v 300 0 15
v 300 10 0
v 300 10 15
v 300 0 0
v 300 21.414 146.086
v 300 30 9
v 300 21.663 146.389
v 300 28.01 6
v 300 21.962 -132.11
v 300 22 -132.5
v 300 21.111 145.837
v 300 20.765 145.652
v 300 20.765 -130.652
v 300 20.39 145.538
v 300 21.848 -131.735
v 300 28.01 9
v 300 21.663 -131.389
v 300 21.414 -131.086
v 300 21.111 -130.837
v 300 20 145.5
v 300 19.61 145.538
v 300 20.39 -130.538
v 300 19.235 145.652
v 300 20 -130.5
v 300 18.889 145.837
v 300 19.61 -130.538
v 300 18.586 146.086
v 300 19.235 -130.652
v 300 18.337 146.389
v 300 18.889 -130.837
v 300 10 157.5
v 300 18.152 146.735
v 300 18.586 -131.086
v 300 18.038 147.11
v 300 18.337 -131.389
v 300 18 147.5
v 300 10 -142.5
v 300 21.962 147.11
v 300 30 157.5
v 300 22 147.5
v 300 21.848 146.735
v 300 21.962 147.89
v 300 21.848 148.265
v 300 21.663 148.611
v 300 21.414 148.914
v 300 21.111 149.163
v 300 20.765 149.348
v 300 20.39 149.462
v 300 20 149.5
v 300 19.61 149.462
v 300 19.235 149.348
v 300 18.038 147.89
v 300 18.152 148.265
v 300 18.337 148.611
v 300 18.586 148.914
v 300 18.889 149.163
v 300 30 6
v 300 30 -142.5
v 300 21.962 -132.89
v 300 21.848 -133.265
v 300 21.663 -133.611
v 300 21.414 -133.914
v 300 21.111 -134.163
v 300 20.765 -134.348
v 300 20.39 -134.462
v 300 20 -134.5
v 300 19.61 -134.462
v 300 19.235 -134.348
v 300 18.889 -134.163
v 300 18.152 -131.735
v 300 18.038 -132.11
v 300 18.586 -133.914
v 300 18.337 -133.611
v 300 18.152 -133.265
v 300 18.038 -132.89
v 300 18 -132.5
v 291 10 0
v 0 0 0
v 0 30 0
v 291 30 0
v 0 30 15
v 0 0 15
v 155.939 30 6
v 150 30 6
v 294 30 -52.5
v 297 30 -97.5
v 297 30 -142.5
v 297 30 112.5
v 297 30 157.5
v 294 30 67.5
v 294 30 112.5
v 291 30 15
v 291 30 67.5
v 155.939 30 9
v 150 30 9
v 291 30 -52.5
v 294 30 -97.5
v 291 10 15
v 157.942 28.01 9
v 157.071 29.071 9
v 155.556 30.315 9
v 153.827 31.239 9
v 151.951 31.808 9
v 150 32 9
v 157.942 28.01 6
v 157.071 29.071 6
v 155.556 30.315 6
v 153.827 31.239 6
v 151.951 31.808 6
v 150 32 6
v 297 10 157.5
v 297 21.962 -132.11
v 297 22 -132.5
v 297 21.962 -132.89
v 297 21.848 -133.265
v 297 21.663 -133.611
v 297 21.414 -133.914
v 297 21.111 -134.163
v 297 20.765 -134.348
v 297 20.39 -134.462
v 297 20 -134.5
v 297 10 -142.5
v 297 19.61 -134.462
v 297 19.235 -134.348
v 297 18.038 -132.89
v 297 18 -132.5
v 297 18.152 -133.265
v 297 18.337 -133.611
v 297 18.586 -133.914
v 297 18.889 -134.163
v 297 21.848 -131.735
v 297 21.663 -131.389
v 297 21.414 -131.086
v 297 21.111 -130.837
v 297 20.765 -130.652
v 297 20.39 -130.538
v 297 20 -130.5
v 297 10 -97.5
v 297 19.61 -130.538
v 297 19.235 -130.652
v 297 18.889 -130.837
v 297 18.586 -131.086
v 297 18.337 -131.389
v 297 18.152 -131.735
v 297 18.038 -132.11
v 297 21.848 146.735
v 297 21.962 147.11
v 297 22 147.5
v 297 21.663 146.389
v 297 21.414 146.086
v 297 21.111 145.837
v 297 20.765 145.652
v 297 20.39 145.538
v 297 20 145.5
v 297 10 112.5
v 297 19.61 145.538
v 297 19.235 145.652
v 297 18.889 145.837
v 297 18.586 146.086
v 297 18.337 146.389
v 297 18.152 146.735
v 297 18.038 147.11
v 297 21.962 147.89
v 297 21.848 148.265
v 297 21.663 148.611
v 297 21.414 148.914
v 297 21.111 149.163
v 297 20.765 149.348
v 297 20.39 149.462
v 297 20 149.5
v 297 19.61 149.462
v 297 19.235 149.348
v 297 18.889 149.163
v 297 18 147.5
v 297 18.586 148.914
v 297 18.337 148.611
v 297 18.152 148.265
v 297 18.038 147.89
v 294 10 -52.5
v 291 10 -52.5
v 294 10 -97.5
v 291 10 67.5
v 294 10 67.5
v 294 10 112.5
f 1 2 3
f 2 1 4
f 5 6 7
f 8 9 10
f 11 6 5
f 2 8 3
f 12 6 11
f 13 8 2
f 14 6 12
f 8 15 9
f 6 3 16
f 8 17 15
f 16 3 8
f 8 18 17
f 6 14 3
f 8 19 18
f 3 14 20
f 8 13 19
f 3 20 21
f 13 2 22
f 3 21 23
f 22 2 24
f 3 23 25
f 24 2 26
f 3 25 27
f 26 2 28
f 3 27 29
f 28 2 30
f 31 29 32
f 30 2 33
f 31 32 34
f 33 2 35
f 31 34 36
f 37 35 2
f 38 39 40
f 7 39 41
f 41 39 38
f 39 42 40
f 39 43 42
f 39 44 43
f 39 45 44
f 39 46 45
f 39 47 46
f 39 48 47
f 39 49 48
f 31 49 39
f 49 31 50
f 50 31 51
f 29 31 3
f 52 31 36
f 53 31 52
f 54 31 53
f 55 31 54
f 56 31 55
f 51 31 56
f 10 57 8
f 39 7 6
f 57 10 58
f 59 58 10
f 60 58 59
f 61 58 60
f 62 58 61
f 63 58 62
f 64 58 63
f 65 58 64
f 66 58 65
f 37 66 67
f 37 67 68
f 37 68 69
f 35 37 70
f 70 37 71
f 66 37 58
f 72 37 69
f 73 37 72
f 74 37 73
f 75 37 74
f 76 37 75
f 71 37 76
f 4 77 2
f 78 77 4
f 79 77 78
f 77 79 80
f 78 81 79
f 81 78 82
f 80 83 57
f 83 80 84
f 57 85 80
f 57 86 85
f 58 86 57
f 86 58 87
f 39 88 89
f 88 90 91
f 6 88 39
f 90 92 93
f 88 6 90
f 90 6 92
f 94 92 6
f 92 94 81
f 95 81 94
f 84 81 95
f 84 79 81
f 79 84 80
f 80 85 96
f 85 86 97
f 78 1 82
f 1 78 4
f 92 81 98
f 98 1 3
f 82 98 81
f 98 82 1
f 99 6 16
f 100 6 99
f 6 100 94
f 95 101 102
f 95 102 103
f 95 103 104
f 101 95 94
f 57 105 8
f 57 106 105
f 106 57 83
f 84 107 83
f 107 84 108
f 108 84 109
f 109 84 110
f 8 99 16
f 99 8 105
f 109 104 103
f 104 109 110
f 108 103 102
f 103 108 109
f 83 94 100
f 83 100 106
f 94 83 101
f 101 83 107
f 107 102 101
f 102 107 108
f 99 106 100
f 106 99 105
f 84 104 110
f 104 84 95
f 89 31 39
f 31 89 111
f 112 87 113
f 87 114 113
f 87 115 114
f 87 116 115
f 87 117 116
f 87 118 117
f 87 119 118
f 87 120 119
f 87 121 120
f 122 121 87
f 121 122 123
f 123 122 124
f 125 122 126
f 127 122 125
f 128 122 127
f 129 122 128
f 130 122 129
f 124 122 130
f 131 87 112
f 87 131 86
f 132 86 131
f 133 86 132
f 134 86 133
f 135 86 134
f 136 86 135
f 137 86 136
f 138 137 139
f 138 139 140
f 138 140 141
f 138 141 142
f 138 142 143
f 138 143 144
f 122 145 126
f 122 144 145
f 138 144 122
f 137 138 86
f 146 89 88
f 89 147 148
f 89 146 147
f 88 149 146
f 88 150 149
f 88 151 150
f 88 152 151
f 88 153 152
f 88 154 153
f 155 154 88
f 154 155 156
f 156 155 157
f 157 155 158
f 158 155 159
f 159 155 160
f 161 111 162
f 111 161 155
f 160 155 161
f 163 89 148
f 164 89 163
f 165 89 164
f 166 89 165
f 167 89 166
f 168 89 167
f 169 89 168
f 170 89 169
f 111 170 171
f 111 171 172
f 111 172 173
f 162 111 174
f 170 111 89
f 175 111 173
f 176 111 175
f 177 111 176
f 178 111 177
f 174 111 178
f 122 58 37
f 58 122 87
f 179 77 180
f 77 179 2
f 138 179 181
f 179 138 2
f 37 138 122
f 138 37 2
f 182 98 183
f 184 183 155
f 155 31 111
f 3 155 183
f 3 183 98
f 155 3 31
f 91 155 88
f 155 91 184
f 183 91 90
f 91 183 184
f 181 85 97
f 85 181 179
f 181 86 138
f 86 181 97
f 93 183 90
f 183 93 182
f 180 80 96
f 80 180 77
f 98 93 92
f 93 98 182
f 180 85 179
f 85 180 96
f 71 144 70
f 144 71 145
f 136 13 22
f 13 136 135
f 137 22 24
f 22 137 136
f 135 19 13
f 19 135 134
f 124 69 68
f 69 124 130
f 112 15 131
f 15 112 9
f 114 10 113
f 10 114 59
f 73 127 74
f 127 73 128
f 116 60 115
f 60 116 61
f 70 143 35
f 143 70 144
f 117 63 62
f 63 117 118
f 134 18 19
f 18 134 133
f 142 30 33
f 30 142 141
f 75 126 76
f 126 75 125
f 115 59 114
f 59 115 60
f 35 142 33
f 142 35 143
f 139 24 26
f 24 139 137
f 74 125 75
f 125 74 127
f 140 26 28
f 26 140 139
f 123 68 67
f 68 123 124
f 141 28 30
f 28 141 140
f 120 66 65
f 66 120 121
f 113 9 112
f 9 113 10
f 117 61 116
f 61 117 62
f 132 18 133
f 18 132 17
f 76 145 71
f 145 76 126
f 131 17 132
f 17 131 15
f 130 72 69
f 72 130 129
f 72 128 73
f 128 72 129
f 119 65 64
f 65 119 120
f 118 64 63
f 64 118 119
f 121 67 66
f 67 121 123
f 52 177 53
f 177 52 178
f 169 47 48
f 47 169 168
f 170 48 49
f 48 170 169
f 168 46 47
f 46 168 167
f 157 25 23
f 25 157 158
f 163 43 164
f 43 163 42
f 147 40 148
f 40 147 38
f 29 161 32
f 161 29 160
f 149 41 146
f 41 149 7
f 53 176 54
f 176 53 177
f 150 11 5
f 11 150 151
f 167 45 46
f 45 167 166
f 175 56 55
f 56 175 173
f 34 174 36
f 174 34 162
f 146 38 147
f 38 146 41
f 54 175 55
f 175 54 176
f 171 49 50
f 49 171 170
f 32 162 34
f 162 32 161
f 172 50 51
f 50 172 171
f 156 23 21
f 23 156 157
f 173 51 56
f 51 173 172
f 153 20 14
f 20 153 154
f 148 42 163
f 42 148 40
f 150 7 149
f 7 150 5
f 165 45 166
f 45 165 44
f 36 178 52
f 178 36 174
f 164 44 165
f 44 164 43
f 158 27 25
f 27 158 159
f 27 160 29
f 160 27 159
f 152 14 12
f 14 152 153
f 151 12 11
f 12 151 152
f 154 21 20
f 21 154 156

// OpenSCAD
// This is a design for a laser-cut plywood crossbow.


// Z-fight fudge. Tweak dimensions this much to avoid z-fighting in the rendering.
// This does not consequentially affect the dimensions physical product.
zff = 0.01;
// How many facets on the circles.
$fn = 32;
// Length of body
body_length = 300;
// Height of body
body_height = 30;
// The thickness of each layer of the body's plywood
body_ply_thickness = 3;
// How many layers of plywood laminated into the body
body_layers = 5;
// The overall thickness of the body.
body_thickness = body_ply_thickness * body_layers;

// Radius of the bolt fired from this crossbow
bolt_r = 2;
// This is the depth of the groove in the top of the body that guides the bolt when fired.
bolt_groove_depth = bolt_r;
// This is the length of the bolt.
bolt_length = 150;

// The radius of the cord.
cord_r = 1;
// The radius of the sear wheel.
sear_r = 10;
// The depth of the cutout into the sear that engages with the trigger arm.
sear_trigger_notch = 2;
// The angle the trigger arm makes to the sear.
sear_trigger_angle = 25;
// The radius of the shaft through the sear.
sear_shaft_r = 1.5;

// This is the rotating mechanism that engages with the cord and the trigger arm to retain
// the cord tension until the trigger is squeezed.
module sear() {
    difference() {
        // The main body of the sear.
        cylinder(r=sear_r, h=body_ply_thickness);
        // The cutout that engages with the cord.
        translate([-100, sear_r-cord_r*2,-zff]) cube([100,cord_r*2, body_ply_thickness+2*zff]);
        // The cutout that engages with the trigger arm.
        rotate([0,0,sear_trigger_angle])
            translate([-100, -sear_r-sear_trigger_notch/2,-zff])
                cube([100,sear_trigger_notch*2, body_ply_thickness+2*zff]);
        // The hole through the centre of the sear through which the shaft passes to secure the sear inside the body.
        cylinder(r=sear_shaft_r, h=body_ply_thickness);
        // TODO add hole to engage with return spring.
    }
}

// This is the body of the crossbow. It contains the trigger arm and the sear.
module body() {
    difference () {
        // Build up the body of the crossbow out of layers.
        for (i = [0:body_layers-1]) {
            translate([0,0,i*body_ply_thickness]) cube([body_length, body_height, body_ply_thickness]);
        }
        // This is the groove that guides the bolt when fired.
        translate([body_length - bolt_length+zff, body_height-bolt_groove_depth+zff, floor(body_layers/2)*body_ply_thickness])
            cube([bolt_length, bolt_groove_depth, body_ply_thickness]);
        // TODO add shafts for sear and trigger.
        // TODO add holes to engage with the springs for the sear and trigger.
        // TODO add the bolt retention/cord guide arm.
    }
}

// This arm protrudes below the body and engages with the sear.
module trigger() {
    // TODO
}

// The number of layers of plywood forming the bow.
bow_layers = 3;
// The thickness of each layer of plywood forming the bow.
bow_ply_thickness = 3;
// The left-to-right length of the bow when assembled.
bow_length = 300;
// The height of the bow.
bow_height = 20;
// The reduction in length of each layer of the bow as a proportion of the length,
// per layer. Think of a leaf spring.
bow_leaf_ratio = 0.3;
// This is the distance between the end of the bow and the cord hole.
bow_cord_tie_offset = 10;

// This is the bow attached to the front of the crossbow. It is bent with the tension of the cord.
module bow() {
    difference () {
        // This is the main body of the bow. It is made of stacked layers of decreasing length.
        for (i = [0:bow_layers-1]) {
            translate([(bow_leaf_ratio*i*bow_length)/2,0,i*bow_ply_thickness])
                cube([bow_length - bow_leaf_ratio*i*bow_length, bow_height, bow_ply_thickness]);
        }
        // This is the notch cut in the top of the bow to let the bolt through.
        translate([bow_length/2-bolt_r, bow_height-bolt_r*2+zff,-zff]) cube([bolt_r*2, bolt_r*2,100]);
        // These are the holes near the end of the bow to tie off the cord.
        translate([bow_cord_tie_offset,bow_height/2,-zff]) cylinder(r=cord_r*2, h=100);
        translate([bow_length - bow_cord_tie_offset,bow_height/2,-zff]) cylinder(r=cord_r*2, h=100);
        // TODO Work out the best way to align the spring force of the bow with the axis of action
        // of the bolt. Currently lots of force will go into dragging the cord along the top of the body.
        // Perhaps make the bolt hole in the centre of the bow, and move the bow up considerbly. May need
        // gussets to transmit force to the body.
        // TODO round over the ends of the bow.
    }
}

// This shows all the parts of the crossbow assembled for visual fit checking.
module assembled() {
    body();
    translate([body_length - bolt_length, body_height - sear_r + cord_r*2, floor(body_layers/2)*body_ply_thickness]) sear();
    translate([body_length,body_height-bow_height,body_thickness/2]) rotate([0,-90,0]) translate([-bow_length/2,0,0]) bow();
}
// body();
// bow();

assembled();
